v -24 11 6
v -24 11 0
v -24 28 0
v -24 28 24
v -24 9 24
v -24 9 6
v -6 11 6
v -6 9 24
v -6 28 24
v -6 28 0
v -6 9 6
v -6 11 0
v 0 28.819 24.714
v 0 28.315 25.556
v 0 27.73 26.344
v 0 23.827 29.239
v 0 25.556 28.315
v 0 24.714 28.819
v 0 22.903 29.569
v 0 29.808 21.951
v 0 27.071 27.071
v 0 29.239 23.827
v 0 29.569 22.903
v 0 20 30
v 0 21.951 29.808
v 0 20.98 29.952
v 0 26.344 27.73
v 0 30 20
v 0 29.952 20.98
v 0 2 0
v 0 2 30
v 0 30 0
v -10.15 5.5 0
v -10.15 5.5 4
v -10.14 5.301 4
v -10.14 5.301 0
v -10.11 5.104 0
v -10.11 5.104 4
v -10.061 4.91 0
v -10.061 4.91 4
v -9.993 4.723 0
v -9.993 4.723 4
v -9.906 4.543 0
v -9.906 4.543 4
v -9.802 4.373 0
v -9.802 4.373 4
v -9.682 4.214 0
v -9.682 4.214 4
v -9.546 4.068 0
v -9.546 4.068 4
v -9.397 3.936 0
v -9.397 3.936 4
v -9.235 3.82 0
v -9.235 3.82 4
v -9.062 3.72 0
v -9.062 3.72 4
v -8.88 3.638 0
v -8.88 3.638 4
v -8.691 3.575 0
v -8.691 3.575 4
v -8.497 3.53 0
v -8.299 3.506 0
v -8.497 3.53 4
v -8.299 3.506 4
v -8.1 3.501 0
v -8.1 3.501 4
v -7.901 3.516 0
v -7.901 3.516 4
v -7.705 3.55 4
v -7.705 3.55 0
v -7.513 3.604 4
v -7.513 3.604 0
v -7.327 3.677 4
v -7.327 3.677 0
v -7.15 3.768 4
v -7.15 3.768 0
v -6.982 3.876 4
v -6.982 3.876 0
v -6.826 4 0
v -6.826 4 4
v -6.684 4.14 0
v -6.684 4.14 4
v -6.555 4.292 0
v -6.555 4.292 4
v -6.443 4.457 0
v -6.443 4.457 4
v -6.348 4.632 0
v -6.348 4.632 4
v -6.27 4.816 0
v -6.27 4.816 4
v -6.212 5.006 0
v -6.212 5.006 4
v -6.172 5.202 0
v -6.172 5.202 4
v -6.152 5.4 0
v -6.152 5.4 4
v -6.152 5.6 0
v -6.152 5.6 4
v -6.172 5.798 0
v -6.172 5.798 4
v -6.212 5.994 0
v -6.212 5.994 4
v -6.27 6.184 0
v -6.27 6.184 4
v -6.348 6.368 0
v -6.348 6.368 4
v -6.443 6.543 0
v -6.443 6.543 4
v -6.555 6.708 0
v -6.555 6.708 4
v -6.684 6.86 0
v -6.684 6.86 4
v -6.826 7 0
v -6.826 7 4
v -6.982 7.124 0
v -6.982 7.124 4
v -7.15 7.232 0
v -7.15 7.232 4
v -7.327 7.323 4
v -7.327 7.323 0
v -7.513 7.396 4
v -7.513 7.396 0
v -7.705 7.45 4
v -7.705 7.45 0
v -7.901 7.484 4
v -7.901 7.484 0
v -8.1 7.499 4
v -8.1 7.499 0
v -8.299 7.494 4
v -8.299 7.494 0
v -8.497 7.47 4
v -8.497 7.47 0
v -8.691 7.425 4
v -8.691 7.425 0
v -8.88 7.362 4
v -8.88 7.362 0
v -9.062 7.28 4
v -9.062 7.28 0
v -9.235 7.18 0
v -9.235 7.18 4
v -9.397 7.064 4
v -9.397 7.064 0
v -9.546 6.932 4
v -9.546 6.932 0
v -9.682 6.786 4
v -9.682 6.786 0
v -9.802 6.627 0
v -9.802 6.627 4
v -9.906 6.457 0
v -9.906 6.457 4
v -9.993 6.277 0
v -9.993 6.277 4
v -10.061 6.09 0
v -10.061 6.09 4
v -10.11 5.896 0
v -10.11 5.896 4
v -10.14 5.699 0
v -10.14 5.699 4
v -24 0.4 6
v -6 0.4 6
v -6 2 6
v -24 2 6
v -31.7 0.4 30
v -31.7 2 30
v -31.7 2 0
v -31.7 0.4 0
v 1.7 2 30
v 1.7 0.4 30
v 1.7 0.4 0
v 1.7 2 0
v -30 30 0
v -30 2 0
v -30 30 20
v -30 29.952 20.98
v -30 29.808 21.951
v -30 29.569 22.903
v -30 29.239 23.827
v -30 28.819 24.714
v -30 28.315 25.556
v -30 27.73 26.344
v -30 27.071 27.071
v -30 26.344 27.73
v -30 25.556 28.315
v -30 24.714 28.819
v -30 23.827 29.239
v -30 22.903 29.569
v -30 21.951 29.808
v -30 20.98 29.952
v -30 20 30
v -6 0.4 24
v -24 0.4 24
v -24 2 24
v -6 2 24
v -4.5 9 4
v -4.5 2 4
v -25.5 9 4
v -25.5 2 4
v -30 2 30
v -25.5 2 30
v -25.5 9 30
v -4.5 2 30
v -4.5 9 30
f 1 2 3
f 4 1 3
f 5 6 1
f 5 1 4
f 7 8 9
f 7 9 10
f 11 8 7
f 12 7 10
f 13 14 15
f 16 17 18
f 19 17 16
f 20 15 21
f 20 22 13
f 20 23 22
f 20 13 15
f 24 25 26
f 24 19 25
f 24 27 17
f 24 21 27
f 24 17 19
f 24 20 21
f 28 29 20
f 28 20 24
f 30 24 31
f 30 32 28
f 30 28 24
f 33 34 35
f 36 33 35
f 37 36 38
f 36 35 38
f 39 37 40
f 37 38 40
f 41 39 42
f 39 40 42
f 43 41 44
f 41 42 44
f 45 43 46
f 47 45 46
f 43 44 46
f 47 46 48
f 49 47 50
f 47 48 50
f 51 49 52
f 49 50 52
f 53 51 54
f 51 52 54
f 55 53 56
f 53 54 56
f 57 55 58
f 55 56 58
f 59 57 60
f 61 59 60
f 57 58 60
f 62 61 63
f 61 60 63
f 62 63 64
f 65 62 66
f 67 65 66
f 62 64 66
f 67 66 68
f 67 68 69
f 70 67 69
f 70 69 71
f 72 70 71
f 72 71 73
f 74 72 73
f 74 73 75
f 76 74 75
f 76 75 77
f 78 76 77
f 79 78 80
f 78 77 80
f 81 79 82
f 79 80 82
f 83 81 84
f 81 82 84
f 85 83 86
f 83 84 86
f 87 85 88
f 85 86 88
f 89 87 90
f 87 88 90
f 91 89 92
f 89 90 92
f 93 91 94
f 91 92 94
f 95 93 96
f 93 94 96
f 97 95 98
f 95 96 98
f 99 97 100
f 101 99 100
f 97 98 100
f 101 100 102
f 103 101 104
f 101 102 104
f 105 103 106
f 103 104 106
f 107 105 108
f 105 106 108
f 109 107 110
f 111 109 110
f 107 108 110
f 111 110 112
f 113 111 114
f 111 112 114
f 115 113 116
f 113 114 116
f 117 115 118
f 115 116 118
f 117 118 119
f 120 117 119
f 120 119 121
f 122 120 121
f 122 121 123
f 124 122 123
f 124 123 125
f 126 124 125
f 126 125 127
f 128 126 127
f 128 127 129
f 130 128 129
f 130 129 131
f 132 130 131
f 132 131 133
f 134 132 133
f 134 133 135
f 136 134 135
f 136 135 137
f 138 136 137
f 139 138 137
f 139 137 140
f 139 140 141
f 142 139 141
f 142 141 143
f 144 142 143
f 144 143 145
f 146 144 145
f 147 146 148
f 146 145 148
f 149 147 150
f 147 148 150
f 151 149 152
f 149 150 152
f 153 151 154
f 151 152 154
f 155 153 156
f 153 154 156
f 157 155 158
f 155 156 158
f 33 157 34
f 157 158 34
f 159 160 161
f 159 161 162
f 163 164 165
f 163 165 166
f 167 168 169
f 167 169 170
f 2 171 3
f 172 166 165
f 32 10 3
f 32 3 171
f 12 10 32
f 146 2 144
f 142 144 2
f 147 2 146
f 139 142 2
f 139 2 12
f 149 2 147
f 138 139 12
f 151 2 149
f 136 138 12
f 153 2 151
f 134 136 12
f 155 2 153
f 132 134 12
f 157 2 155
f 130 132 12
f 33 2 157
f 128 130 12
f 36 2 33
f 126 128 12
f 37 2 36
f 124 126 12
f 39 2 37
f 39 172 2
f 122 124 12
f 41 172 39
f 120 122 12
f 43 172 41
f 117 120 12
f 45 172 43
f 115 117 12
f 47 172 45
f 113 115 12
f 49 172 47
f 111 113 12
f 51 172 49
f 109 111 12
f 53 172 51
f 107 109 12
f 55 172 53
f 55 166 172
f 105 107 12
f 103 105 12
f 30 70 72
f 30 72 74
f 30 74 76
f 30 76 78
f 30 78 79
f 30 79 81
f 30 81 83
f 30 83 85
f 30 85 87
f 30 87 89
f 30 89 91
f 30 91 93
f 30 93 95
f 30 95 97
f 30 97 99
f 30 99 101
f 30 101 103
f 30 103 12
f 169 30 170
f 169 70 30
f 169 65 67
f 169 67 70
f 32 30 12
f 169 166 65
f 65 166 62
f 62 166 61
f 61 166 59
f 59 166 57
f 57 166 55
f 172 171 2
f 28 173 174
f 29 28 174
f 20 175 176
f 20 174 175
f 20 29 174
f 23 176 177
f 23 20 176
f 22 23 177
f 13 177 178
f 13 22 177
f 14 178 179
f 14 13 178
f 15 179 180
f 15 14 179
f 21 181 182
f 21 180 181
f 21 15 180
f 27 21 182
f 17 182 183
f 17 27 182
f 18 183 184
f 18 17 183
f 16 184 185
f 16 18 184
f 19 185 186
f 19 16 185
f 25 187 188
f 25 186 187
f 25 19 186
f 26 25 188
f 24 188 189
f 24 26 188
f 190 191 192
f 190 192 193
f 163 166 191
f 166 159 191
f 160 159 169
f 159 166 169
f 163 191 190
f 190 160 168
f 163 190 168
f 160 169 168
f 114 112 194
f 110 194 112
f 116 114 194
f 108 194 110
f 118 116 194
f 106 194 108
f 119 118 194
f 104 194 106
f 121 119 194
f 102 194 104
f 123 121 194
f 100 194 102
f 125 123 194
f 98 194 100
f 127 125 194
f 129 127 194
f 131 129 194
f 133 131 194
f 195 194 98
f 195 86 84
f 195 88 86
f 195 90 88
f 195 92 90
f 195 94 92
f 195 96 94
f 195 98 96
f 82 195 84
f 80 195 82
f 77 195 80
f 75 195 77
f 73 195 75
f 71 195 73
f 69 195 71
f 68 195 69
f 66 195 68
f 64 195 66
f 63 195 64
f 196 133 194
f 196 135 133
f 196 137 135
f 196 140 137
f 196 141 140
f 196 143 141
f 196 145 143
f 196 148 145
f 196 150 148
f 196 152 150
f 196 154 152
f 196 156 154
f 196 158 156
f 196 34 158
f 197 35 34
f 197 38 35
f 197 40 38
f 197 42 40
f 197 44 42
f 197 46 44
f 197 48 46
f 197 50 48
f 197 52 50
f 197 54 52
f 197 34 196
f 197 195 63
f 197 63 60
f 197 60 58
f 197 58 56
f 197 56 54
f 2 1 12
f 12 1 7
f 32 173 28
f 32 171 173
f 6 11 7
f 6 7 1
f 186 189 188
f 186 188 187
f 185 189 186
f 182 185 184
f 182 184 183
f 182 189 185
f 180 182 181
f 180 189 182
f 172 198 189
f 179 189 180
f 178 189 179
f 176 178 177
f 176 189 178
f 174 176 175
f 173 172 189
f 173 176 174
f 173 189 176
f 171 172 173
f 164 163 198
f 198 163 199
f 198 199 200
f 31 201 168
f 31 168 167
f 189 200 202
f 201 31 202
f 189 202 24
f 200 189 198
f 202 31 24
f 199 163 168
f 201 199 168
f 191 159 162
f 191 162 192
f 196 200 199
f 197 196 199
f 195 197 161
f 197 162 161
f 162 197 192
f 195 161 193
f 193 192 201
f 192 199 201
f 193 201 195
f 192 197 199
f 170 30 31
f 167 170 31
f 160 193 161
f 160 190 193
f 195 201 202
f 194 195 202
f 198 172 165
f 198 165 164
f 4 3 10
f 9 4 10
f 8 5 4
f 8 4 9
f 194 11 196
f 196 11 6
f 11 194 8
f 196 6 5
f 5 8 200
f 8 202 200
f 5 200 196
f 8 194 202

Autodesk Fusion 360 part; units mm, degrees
sketch "Sketch1" plane through (0, 0, 0) normal (0, 0, 1) x (1, 0, 0)
  line L0 (0, 0) -> (-30, 0)
  line L1 (-30, 0) -> (-30, 30)
  line L2 (-30, 30) -> (0, 30)
  line L3 (0, 30) -> (0, 0)
  dimension "d1" = 30
  dimension "d2" = 30
extrude "Extrude1" add sketch "Sketch1" along normal blind 30
sketch "Sketch2" plane through (0, 0, 30) normal (0, 0, 1) x (-1, 0, 0)
  line L0 (0, -30) -> (30, -30)
  line L1 (30, -30) -> (30, 0)
  line L2 (30, 0) -> (0, 0)
  line L3 (0, 0) -> (0, -30)
  line L4 (30, 0) -> (25.5, 0)
  line L5 (25.5, 0) -> (25.5, -2)
  line L6 (25.5, -2) -> (30, -2)
  line L7 (30, -2) -> (30, 0)
  line L8 (25.5, -2) -> (4.5, -2)
  line L9 (4.5, -2) -> (4.5, -9)
  line L10 (4.5, -9) -> (25.5, -9)
  line L11 (25.5, -9) -> (25.5, -2)
  dimension "d5" = 4.5
  dimension "d6" = 2
  dimension "d7" = 21
  dimension "d8" = 7
extrude "Extrude2" cut sketch "Sketch2" against normal blind 25 contours L8 L9 L10 L11
sketch "Sketch3" plane through (0, 0, 0) normal (0, -1, 0) x (1, 0, 0)
  line L0 (-30, 0) -> (0, 0)
  line L1 (0, 0) -> (0, 30)
  line L2 (0, 30) -> (-30, 30)
  line L3 (-30, 30) -> (-30, 0)
  line L4 (-6, 6) -> (-24, 6)
  line L5 (-24, 6) -> (-24, 24)
  line L6 (-24, 24) -> (-6, 24)
  line L7 (-6, 24) -> (-6, 6)
  line L8 (-6, 6) -> (-24, 24) construction
  line L9 (-24, 6) -> (-6, 24) construction
  point P0 (-15, 15)
  dimension "d11" = 18
  dimension "d12" = 18
extrude "Extrude3" cut sketch "Sketch3" against normal blind 2 contours L4 L5 L6 L7
sketch "Sketch4" plane through (0, 0, 0) normal (1, 0, 0) x (0, 1, 0)
  line L0 (0, 0) -> (30, 0)
  line L1 (30, 0) -> (30, 30)
  line L2 (30, 30) -> (0, 30)
  line L3 (0, 30) -> (0, 0)
  line L4 (0, 0) -> (2, 0)
  line L5 (2, 0) -> (2, 30)
  line L6 (2, 30) -> (0, 30)
  line L7 (0, 30) -> (0, 0)
  dimension "d15" = 2
  dimension "d16" = 30
extrude "Extrude4" add sketch "Sketch4" along normal blind 2 contours L0 L2 L3 L4 L5 L6 L7
sketch "Sketch5" plane through (-30, 0, 0) normal (-1, 0, 0) x (0, -1, 0)
  line L0 (-30, 0) -> (0, 0)
  line L1 (0, 0) -> (0, 30)
  line L2 (0, 30) -> (-30, 30)
  line L3 (-30, 30) -> (-30, 0)
  line L4 (0, 0) -> (-2, 0)
  line L5 (-2, 0) -> (-2, 30)
  line L6 (-2, 30) -> (0, 30)
  line L7 (0, 30) -> (0, 0)
  dimension "d19" = 2
  dimension "d20" = 30
extrude "Extrude5" add sketch "Sketch5" along normal blind 2 contours L0 L1 L2 L4 L5 L6 L7
sketch "Sketch6" plane through (0, 0, 5) normal (0, 0, 1) x (-1, 0, 0)
  line L0 (25.5, -9) -> (25.5, -2)
  line L1 (25.5, -2) -> (4.5, -2)
  line L2 (4.5, -2) -> (4.5, -9)
  line L3 (4.5, -9) -> (25.5, -9)
  circle A0 centre (6, -5) radius 1
  dimension "d23" = 2
extrude "Extrude6" cut sketch "Sketch6" against normal blind 5 contours A0
sketch "Sketch7" plane through (0, 0, 0) normal (0, -1, 0) x (1, 0, 0)
  line L0 (-24, 6) -> (-24, 24)
  line L1 (-24, 24) -> (-6, 24)
  line L2 (-6, 24) -> (-6, 6)
  line L3 (-6, 6) -> (-24, 6)
  line L4 (-32, 0) -> (2, 0)
  line L5 (2, 0) -> (2, 30)
  line L6 (2, 30) -> (-32, 30)
  line L7 (-32, 30) -> (-32, 0)
  line L8 (-6, 6) -> (-24, 6)
  line L9 (-24, 6) -> (-24, 24)
  line L10 (-24, 24) -> (-6, 24)
  line L11 (-6, 24) -> (-6, 6)
extrude "Extrude7" cut sketch "Sketch7" against normal blind 28 contours L0 L1 L2 L3 L8 L9 L10 L11
fillet "Fillet1" radius 10 1 edges at (-15, 30, 30)
sketch "Sketch8" plane through (0, 0, 6) normal (0, 0, 1) x (-1, 0, 0)
  line L0 (24, -9) -> (6, -9)
  line L1 (6, -9) -> (6, -28)
  line L2 (6, -28) -> (24, -28)
  line L3 (24, -28) -> (24, -9)
  line L4 (24, -28) -> (6, -28)
  line L5 (6, -28) -> (6, -9)
  line L6 (6, -9) -> (24, -9)
  line L7 (24, -9) -> (24, -28)
sketch "Sketch9" plane through (0, 0, 6) normal (0, 0, 1) x (-1, 0, 0)
  line L0 (6, -9) -> (8, -9)
  line L1 (8, -9) -> (8, -11)
  line L2 (8, -11) -> (6, -11)
  line L3 (6, -11) -> (6, -9)
  line L4 (6, -11) -> (24, -11)
  line L5 (24, -11) -> (24, -28)
  line L6 (24, -28) -> (6, -28)
  line L7 (6, -28) -> (6, -11)
  point P0 (6, -9)
  point P1 (24, -28)
  dimension "d30" = 2
  dimension "d31" = 2
extrude "Extrude8" cut sketch "Sketch9" against normal blind 10 contours L2 L4 L5 L6 L7
extrude "Extrude9" cut 1 faces at (-29.3333, 0, 18) along direction (0, 1, 0) blind 0.2
sketch "Sketch10" plane through (0, 0, 0) normal (0, 0, -1) x (1, 0, 0)
  line L0 (2, -0.2) -> (-32, -0.2)
  line L1 (-32, -0.2) -> (-32, -2)
  line L2 (-32, -2) -> (-30, -2)
  line L3 (-30, -2) -> (-30, -30)
  line L4 (-30, -30) -> (0, -30)
  line L5 (0, -30) -> (0, -2)
  line L6 (0, -2) -> (2, -2)
  line L7 (2, -2) -> (2, -0.2)
  circle A0 centre (-6, -5) radius 1
  line L8 (-24, -28) -> (-24, -11)
  line L9 (-24, -11) -> (-6, -11)
  line L10 (-6, -11) -> (-6, -28)
  line L11 (-6, -28) -> (-24, -28)
extrude "Extrude10" add sketch "Sketch10" against normal blind 5 contours A0
extrude "Extrude11" cut 1 faces at (-11.5, 6.6667, 5) along direction (0, 0, -1) blind 1
sketch "Sketch11" plane through (0, 0, 4) normal (0, 0, 1) x (-1, 0, 0)
  line L0 (25.5, -9) -> (25.5, -2)
  line L1 (25.5, -2) -> (4.5, -2)
  line L2 (4.5, -2) -> (4.5, -9)
  line L3 (4.5, -9) -> (25.5, -9)
  circle A0 centre (8.1497, -5.5) radius 2
  dimension "d40" = 4
extrude "Extrude12" cut sketch "Sketch11" against normal blind 4 contours A0
extrude "Extrude13" cut 1 faces at (2, 0.8, 20) along direction (-1, 0, 0) blind 0.2
extrude "Extrude14" cut 1 faces at (-32, 1.4, 20) along direction (1, 0, 0) blind 0.2
extrude "Extrude15" cut 1 faces at (1.8, 0.8, 20) along direction (-1, 0, 0) blind 0.1
extrude "Extrude16" cut 1 faces at (-29.2, 0.2, 18) along direction (0, 1, 0) blind 0.2
extrude "Extrude17" cut 1 faces at (-31.8, 1.4667, 20) along direction (1, 0, 0) blind 0.1
